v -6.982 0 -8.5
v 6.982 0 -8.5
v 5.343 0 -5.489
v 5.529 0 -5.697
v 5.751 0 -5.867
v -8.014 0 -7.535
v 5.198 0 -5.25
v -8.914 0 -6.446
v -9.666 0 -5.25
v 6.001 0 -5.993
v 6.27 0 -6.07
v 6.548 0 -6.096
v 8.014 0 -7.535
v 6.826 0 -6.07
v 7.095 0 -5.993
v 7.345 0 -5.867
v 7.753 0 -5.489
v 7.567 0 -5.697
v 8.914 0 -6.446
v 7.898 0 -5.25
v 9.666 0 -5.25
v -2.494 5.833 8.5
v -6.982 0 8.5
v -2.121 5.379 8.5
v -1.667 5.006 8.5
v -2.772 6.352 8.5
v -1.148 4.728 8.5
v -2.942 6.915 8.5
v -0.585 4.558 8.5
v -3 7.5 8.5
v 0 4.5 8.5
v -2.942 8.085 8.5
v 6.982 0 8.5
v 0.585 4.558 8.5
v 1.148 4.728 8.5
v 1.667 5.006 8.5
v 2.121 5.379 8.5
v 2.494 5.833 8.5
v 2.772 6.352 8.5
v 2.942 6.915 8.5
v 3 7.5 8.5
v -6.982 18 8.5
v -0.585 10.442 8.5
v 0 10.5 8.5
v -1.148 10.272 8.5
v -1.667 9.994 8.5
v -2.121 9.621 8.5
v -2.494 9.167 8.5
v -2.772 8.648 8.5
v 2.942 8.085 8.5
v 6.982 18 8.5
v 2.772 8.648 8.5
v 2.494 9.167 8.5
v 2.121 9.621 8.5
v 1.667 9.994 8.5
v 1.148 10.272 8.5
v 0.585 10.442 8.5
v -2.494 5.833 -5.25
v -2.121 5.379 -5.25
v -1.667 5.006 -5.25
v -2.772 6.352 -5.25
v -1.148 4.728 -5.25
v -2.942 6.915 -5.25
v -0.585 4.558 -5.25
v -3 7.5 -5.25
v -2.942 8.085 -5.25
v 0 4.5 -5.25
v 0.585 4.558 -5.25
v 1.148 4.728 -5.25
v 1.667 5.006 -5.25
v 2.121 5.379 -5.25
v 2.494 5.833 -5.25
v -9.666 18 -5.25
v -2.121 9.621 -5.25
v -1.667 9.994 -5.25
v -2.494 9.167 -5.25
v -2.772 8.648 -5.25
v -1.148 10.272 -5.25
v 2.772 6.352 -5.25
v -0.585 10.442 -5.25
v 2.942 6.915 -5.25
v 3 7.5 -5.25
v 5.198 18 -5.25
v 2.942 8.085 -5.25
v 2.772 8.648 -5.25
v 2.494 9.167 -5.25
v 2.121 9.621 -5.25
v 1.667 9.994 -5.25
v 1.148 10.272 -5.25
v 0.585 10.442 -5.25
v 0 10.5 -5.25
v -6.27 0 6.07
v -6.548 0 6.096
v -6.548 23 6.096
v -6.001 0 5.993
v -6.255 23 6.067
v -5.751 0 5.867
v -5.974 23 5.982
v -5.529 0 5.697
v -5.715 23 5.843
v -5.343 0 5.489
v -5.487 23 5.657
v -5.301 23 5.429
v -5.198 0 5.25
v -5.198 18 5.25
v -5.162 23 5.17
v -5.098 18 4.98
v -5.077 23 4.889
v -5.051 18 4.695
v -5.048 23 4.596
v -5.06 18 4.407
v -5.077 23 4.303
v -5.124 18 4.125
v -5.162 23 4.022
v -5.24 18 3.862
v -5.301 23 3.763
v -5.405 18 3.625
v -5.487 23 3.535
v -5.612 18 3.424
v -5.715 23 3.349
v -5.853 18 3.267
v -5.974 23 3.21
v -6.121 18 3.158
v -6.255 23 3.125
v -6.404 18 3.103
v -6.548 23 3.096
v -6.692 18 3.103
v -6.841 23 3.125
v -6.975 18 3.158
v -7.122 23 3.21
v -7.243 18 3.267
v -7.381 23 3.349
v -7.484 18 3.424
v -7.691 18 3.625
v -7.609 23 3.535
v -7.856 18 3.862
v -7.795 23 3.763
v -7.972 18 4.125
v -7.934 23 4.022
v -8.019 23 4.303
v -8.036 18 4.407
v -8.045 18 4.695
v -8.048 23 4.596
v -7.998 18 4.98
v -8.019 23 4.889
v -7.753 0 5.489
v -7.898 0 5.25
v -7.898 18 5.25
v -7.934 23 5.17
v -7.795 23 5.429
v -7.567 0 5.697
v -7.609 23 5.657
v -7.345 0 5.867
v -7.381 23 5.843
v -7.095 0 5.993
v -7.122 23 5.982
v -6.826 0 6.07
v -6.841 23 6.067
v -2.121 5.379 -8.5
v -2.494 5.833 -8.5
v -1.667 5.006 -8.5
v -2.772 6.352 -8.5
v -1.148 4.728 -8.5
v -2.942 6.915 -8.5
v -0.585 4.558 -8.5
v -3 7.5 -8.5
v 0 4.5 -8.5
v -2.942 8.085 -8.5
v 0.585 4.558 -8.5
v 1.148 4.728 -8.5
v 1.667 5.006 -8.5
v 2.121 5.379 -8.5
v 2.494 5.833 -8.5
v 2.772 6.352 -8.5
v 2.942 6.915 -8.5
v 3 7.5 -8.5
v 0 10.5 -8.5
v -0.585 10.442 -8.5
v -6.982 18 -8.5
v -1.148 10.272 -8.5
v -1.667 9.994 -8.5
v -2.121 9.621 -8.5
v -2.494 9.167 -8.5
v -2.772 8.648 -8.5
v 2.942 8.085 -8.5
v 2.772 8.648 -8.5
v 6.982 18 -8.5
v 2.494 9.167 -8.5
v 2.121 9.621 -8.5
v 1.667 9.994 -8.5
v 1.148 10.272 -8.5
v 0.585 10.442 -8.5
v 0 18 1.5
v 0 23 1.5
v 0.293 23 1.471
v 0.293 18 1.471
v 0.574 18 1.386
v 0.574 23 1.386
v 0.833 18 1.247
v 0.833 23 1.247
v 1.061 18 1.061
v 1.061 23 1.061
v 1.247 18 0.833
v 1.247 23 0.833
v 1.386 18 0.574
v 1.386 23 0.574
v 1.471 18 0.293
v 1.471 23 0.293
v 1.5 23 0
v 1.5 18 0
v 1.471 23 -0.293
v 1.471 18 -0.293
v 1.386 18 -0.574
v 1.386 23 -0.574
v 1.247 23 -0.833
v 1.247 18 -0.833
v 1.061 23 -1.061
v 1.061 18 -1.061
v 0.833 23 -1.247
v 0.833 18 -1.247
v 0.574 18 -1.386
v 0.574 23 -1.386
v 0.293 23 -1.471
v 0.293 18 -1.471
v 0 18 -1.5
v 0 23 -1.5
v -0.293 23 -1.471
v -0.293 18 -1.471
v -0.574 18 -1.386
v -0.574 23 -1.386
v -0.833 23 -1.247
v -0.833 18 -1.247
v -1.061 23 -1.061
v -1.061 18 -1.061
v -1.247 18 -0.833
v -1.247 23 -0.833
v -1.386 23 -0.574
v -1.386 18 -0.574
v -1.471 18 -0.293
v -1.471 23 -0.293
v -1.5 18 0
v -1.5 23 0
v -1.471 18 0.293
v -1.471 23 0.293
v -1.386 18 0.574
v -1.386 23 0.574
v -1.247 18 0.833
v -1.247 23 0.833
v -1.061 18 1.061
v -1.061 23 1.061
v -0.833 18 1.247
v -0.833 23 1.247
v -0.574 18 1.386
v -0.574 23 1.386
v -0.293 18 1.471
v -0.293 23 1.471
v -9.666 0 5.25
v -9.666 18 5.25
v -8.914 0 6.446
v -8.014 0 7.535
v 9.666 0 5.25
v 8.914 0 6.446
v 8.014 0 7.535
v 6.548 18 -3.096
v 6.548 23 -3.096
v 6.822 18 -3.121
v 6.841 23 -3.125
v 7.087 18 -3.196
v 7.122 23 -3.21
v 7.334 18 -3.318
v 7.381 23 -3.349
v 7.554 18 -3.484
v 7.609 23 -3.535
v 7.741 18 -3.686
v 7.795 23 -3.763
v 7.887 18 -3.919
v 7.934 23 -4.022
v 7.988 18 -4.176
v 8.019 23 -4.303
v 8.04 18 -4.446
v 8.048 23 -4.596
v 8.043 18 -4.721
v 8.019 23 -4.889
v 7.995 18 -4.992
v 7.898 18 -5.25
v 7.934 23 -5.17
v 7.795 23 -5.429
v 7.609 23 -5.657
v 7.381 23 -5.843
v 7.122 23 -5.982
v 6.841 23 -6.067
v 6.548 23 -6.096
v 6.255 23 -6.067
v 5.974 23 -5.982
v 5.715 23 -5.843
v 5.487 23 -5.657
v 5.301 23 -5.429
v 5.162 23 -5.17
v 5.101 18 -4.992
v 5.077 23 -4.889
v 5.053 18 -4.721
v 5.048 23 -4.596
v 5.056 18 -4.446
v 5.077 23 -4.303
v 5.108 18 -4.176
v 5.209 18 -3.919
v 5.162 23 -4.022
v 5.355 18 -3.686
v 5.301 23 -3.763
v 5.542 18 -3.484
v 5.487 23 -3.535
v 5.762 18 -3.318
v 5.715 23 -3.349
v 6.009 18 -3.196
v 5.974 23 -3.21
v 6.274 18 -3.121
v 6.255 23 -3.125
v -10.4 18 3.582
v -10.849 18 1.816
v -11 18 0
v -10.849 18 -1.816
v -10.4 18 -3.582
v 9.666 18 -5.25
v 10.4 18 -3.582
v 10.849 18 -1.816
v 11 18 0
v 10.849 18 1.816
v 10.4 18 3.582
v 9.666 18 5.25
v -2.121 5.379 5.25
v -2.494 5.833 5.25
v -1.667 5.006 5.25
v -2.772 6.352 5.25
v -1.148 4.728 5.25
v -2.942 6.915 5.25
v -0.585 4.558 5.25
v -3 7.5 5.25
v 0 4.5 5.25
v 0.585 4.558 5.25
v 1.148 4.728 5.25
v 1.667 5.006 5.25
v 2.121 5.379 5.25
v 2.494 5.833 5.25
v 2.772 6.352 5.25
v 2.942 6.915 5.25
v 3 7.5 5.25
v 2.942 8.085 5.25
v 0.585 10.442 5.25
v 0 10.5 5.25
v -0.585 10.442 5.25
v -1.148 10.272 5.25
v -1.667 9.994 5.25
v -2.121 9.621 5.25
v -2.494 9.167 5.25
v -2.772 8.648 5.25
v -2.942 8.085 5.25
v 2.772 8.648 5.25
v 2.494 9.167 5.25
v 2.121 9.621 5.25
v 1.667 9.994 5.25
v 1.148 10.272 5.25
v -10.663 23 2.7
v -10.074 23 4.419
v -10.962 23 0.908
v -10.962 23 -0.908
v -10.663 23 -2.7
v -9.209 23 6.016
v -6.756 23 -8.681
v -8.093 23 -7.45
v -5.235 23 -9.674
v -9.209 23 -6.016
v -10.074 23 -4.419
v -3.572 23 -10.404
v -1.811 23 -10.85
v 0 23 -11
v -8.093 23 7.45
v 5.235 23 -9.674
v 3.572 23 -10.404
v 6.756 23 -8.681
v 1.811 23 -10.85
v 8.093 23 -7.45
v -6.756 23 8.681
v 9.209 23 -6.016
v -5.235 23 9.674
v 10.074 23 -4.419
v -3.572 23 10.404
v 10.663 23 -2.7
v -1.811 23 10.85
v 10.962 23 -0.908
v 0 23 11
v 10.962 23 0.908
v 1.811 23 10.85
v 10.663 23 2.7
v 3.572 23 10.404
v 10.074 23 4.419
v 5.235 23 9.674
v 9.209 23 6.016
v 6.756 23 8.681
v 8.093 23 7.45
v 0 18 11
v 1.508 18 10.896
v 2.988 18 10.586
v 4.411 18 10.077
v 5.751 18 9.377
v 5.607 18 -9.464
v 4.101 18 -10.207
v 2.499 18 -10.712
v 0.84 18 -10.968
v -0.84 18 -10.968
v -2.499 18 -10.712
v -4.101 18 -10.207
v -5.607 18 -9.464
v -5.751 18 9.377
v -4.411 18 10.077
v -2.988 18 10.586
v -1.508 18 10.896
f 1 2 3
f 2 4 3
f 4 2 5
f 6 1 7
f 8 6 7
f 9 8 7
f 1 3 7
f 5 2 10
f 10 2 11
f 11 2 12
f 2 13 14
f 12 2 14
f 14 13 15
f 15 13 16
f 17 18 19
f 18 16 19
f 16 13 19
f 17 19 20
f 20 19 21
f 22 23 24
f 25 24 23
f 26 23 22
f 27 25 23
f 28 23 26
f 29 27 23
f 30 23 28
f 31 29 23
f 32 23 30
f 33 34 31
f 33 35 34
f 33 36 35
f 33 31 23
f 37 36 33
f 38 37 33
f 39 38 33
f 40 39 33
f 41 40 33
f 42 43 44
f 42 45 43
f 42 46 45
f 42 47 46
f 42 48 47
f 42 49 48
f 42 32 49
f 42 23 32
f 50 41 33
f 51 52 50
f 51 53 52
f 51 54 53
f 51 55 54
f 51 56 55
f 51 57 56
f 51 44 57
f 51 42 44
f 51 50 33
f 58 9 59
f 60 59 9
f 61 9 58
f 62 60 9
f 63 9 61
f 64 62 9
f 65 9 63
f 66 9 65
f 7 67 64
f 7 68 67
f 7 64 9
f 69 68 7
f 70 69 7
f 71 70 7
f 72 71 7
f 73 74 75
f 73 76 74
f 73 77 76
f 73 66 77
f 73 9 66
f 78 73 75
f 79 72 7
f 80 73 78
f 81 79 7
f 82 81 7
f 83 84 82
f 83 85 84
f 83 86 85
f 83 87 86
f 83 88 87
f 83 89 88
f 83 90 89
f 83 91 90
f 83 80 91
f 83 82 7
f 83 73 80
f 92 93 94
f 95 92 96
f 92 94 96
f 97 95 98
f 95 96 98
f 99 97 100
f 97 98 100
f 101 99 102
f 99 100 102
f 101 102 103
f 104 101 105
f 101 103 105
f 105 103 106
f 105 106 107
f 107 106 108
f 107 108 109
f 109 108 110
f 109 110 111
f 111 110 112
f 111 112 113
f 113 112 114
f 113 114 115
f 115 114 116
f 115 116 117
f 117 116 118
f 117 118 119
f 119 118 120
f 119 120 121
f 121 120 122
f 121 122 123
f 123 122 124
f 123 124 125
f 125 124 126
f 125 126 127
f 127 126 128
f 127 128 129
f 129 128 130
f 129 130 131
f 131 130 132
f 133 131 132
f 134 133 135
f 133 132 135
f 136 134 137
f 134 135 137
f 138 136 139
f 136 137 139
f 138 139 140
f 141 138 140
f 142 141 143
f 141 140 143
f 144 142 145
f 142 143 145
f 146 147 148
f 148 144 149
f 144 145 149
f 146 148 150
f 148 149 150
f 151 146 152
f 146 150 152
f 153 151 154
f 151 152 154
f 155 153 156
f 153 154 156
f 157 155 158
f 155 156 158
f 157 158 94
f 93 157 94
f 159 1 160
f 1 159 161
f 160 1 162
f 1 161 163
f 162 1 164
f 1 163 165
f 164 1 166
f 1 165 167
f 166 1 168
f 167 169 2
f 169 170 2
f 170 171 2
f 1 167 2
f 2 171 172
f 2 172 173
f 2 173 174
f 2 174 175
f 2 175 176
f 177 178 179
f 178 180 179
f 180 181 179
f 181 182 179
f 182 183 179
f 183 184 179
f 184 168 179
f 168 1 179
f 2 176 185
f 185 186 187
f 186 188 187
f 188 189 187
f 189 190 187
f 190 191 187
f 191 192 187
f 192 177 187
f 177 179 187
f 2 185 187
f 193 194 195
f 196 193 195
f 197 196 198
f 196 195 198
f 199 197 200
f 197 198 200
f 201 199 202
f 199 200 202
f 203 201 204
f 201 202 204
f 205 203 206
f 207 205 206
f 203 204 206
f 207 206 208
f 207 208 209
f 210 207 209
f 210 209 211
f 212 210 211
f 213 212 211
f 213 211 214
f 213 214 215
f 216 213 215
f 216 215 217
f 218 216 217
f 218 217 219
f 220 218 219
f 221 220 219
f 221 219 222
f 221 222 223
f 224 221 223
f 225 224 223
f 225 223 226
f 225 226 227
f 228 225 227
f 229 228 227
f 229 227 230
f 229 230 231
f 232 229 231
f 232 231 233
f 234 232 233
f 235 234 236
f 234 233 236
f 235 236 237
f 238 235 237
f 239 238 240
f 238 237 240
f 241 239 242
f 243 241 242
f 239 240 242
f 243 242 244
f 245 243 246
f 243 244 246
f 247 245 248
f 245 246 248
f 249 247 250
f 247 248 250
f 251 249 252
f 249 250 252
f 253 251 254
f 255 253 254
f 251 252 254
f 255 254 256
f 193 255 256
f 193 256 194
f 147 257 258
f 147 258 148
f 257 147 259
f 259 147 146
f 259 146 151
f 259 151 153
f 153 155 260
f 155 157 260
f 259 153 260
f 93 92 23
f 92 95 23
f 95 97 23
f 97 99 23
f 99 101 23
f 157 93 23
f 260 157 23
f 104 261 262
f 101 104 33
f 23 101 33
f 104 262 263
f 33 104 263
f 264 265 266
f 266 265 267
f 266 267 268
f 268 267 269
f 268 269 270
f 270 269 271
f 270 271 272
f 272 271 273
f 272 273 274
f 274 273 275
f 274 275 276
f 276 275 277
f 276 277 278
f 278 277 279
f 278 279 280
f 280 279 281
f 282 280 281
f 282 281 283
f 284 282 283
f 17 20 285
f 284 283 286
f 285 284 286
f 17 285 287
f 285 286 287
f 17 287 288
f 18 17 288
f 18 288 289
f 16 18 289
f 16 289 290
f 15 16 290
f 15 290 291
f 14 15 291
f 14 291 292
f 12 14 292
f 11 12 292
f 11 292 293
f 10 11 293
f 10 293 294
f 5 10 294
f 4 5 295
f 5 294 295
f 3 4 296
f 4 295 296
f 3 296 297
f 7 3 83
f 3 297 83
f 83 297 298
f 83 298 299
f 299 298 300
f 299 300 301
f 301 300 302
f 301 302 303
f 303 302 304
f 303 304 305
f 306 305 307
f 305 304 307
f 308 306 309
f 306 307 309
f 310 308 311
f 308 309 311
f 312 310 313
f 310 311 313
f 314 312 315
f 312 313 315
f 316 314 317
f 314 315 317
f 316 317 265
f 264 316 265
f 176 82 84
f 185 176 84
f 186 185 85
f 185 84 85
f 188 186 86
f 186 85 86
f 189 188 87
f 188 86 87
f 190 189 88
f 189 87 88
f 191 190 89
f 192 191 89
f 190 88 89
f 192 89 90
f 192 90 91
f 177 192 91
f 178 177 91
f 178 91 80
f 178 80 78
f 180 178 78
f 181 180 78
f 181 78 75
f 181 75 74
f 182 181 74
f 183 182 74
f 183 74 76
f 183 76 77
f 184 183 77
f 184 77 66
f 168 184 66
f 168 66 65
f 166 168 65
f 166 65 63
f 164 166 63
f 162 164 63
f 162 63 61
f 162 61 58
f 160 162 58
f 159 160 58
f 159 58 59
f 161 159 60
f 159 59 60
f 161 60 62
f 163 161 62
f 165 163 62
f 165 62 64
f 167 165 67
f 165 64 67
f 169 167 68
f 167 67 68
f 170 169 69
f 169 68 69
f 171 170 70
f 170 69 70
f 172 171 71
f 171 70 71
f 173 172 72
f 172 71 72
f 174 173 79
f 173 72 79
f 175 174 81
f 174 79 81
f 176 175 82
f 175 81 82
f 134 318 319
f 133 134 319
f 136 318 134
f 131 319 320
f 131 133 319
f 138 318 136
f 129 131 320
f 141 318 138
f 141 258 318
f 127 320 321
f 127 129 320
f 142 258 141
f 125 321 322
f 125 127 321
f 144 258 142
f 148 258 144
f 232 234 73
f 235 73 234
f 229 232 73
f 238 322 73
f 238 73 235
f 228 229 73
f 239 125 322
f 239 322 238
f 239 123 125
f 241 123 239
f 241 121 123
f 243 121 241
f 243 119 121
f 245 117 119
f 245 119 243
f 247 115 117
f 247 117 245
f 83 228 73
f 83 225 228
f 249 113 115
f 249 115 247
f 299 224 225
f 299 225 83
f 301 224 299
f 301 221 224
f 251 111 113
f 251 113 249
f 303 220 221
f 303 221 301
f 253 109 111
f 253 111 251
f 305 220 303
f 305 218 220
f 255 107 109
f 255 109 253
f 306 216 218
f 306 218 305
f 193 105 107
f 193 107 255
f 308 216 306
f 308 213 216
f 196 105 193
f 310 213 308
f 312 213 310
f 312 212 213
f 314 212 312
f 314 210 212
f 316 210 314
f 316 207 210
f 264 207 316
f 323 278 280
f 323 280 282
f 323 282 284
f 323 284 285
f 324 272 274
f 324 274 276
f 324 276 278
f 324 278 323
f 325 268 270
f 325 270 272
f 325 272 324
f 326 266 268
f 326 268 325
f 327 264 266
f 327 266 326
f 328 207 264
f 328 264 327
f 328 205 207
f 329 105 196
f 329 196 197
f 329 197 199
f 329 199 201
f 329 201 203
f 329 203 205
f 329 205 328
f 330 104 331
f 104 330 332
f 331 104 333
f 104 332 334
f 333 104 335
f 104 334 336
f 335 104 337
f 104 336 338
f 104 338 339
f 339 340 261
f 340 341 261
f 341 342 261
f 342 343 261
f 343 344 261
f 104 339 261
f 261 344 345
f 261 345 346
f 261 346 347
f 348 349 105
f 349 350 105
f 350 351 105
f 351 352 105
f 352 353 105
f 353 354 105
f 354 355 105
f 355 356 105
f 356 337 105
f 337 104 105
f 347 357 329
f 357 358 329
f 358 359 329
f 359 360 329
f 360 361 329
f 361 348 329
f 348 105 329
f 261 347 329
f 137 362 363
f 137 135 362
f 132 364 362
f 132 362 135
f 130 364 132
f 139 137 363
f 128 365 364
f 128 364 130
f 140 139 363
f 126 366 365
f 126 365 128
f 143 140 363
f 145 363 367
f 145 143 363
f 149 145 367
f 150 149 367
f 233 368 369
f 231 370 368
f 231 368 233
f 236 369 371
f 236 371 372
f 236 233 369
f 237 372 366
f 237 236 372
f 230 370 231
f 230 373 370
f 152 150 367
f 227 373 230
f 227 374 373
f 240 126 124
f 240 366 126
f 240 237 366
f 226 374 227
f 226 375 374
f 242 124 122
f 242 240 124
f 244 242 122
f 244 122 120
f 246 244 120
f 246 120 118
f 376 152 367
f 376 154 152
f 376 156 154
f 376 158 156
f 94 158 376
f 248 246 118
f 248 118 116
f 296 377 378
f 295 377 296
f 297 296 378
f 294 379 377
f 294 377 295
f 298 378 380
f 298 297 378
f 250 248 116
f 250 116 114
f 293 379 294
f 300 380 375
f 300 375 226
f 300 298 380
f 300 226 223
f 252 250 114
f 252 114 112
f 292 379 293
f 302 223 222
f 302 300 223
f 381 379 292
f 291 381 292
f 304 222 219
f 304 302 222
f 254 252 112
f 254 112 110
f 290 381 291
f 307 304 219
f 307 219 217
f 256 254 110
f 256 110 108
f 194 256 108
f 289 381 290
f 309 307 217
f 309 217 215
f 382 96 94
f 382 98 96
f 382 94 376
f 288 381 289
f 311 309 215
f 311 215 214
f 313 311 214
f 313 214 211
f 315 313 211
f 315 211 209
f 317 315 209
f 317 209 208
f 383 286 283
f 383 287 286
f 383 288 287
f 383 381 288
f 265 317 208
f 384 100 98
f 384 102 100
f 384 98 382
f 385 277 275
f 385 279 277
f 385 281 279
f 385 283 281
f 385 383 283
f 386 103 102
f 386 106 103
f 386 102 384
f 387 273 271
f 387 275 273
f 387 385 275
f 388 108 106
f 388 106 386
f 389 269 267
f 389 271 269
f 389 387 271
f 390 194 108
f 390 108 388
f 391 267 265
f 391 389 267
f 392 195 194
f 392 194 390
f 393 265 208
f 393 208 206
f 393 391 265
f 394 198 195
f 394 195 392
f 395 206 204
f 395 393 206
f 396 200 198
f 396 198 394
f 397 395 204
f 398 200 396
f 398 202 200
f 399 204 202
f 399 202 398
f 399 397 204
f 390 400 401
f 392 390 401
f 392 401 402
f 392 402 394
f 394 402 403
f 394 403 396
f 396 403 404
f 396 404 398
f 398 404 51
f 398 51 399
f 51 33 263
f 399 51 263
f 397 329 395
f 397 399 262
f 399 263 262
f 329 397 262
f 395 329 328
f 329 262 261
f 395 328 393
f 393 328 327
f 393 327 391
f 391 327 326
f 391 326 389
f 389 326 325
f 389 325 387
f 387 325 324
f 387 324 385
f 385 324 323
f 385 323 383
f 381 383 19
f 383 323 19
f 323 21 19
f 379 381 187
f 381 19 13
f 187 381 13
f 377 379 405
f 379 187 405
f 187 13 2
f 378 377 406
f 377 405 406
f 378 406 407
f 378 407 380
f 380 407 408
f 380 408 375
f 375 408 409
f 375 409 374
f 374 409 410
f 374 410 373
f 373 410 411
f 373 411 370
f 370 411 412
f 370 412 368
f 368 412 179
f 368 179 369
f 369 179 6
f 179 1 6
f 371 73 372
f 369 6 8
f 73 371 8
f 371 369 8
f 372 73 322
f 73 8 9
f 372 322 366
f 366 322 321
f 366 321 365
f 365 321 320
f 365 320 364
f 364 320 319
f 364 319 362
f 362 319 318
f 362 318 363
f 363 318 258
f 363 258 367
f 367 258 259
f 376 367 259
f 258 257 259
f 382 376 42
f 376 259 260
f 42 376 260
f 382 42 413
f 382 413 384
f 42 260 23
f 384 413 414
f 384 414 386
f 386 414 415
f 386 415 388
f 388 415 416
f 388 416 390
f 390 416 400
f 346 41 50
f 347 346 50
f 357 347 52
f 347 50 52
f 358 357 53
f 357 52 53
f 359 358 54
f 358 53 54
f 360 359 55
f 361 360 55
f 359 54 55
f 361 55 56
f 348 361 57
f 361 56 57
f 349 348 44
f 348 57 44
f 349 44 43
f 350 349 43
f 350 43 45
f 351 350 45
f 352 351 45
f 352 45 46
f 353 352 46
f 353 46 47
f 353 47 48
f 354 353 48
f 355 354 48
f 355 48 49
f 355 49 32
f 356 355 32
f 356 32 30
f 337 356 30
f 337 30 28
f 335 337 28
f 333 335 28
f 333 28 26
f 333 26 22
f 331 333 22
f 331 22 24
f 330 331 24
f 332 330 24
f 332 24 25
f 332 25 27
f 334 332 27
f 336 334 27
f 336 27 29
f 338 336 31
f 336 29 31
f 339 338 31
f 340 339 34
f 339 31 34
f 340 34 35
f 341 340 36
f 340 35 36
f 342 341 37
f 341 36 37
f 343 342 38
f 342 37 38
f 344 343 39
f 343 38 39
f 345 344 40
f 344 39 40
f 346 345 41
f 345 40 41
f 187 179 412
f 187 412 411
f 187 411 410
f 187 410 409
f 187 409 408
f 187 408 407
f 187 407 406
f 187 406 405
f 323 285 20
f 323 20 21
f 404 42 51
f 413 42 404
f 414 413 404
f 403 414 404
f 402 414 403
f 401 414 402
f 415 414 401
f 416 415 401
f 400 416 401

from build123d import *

# Parameters (mm, degrees)
SKETCH_2_R          = 11
EXTRUDE_1_DEPTH     = 23
CUT_EXTRUDE_START   = -8.5
SKETCH_3_W          = 30
SKETCH_3_H          = 18
CUT_EXTRUDE_1_DEPTH = 20.266886754
CUT_EXTRUDE_START_2 = 8.5
SKETCH_3_5_W        = 30
SKETCH_3_5_H        = 18
CUT_EXTRUDE_2_DEPTH = 20.266886754
SKETCH_3_6_W        = 30
SKETCH_3_6_H        = 18
CUT_EXTRUDE_3_DEPTH = 5.25
SKETCH_4_R          = 3
CUT_EXTRUDE_4_DEPTH = 33.097507691
SKETCH_6_R          = 1.5
CUT_EXTRUDE_5_DEPTH = 28.766886754
SKETCH_8_R          = 1.5
CUT_EXTRUDE_6_DEPTH = 28.766886754


with BuildPart() as part:
    # 草图2 → 凸台-拉伸1 (new body)
    with BuildSketch(Plane(origin=(0, 0, 0), x_dir=(1, 0, 0), z_dir=(0, 1, 0))):
        Circle(SKETCH_2_R)
    extrude(amount=EXTRUDE_1_DEPTH)

    # 草图3 → 切除-拉伸1 (cut, through all)
    with BuildSketch(Plane.XY.offset(CUT_EXTRUDE_START)):
        with Locations((4, 9)):
            Rectangle(SKETCH_3_W, SKETCH_3_H)
    extrude(amount=-CUT_EXTRUDE_1_DEPTH, mode=Mode.SUBTRACT)

    # 草图3<5> → 切除-拉伸2 (cut, through all)
    with BuildSketch(Plane.XY.offset(CUT_EXTRUDE_START_2)):
        with Locations((4, 9)):
            Rectangle(SKETCH_3_5_W, SKETCH_3_5_H)
    extrude(amount=CUT_EXTRUDE_2_DEPTH, mode=Mode.SUBTRACT)

    # 草图3<6> → 切除-拉伸3 (cut, symmetric)
    with BuildSketch(Plane.XY):
        with Locations((4, 9)):
            Rectangle(SKETCH_3_6_W, SKETCH_3_6_H)
    extrude(amount=CUT_EXTRUDE_3_DEPTH, both=True, mode=Mode.SUBTRACT)

    # 草图4 → 切除-拉伸4 (cut, through all)
    with BuildSketch(Plane.XY.offset(8.5)):
        with Locations((0, 7.5)):
            Circle(SKETCH_4_R)
    extrude(amount=-CUT_EXTRUDE_4_DEPTH, mode=Mode.SUBTRACT)

    # 草图6 → 切除-拉伸5 (cut, through all)
    with BuildSketch(Plane(origin=(0, 23, 0), x_dir=(1, 0, 0), z_dir=(0, 1, 0))):
        Circle(SKETCH_6_R)
    extrude(amount=-CUT_EXTRUDE_5_DEPTH, mode=Mode.SUBTRACT)

    # 草图8 → 切除-拉伸6 (cut, through all)
    with BuildSketch(Plane(origin=(0, 23, 0), x_dir=(1, 0, 0), z_dir=(0, 1, 0))):
        with Locations((-6.547985936, -4.596072256)):
            Circle(SKETCH_8_R)
        with Locations((6.547985936, 4.596072256)):
            Circle(SKETCH_8_R)
    extrude(amount=-CUT_EXTRUDE_6_DEPTH, mode=Mode.SUBTRACT)


solid = part.part
